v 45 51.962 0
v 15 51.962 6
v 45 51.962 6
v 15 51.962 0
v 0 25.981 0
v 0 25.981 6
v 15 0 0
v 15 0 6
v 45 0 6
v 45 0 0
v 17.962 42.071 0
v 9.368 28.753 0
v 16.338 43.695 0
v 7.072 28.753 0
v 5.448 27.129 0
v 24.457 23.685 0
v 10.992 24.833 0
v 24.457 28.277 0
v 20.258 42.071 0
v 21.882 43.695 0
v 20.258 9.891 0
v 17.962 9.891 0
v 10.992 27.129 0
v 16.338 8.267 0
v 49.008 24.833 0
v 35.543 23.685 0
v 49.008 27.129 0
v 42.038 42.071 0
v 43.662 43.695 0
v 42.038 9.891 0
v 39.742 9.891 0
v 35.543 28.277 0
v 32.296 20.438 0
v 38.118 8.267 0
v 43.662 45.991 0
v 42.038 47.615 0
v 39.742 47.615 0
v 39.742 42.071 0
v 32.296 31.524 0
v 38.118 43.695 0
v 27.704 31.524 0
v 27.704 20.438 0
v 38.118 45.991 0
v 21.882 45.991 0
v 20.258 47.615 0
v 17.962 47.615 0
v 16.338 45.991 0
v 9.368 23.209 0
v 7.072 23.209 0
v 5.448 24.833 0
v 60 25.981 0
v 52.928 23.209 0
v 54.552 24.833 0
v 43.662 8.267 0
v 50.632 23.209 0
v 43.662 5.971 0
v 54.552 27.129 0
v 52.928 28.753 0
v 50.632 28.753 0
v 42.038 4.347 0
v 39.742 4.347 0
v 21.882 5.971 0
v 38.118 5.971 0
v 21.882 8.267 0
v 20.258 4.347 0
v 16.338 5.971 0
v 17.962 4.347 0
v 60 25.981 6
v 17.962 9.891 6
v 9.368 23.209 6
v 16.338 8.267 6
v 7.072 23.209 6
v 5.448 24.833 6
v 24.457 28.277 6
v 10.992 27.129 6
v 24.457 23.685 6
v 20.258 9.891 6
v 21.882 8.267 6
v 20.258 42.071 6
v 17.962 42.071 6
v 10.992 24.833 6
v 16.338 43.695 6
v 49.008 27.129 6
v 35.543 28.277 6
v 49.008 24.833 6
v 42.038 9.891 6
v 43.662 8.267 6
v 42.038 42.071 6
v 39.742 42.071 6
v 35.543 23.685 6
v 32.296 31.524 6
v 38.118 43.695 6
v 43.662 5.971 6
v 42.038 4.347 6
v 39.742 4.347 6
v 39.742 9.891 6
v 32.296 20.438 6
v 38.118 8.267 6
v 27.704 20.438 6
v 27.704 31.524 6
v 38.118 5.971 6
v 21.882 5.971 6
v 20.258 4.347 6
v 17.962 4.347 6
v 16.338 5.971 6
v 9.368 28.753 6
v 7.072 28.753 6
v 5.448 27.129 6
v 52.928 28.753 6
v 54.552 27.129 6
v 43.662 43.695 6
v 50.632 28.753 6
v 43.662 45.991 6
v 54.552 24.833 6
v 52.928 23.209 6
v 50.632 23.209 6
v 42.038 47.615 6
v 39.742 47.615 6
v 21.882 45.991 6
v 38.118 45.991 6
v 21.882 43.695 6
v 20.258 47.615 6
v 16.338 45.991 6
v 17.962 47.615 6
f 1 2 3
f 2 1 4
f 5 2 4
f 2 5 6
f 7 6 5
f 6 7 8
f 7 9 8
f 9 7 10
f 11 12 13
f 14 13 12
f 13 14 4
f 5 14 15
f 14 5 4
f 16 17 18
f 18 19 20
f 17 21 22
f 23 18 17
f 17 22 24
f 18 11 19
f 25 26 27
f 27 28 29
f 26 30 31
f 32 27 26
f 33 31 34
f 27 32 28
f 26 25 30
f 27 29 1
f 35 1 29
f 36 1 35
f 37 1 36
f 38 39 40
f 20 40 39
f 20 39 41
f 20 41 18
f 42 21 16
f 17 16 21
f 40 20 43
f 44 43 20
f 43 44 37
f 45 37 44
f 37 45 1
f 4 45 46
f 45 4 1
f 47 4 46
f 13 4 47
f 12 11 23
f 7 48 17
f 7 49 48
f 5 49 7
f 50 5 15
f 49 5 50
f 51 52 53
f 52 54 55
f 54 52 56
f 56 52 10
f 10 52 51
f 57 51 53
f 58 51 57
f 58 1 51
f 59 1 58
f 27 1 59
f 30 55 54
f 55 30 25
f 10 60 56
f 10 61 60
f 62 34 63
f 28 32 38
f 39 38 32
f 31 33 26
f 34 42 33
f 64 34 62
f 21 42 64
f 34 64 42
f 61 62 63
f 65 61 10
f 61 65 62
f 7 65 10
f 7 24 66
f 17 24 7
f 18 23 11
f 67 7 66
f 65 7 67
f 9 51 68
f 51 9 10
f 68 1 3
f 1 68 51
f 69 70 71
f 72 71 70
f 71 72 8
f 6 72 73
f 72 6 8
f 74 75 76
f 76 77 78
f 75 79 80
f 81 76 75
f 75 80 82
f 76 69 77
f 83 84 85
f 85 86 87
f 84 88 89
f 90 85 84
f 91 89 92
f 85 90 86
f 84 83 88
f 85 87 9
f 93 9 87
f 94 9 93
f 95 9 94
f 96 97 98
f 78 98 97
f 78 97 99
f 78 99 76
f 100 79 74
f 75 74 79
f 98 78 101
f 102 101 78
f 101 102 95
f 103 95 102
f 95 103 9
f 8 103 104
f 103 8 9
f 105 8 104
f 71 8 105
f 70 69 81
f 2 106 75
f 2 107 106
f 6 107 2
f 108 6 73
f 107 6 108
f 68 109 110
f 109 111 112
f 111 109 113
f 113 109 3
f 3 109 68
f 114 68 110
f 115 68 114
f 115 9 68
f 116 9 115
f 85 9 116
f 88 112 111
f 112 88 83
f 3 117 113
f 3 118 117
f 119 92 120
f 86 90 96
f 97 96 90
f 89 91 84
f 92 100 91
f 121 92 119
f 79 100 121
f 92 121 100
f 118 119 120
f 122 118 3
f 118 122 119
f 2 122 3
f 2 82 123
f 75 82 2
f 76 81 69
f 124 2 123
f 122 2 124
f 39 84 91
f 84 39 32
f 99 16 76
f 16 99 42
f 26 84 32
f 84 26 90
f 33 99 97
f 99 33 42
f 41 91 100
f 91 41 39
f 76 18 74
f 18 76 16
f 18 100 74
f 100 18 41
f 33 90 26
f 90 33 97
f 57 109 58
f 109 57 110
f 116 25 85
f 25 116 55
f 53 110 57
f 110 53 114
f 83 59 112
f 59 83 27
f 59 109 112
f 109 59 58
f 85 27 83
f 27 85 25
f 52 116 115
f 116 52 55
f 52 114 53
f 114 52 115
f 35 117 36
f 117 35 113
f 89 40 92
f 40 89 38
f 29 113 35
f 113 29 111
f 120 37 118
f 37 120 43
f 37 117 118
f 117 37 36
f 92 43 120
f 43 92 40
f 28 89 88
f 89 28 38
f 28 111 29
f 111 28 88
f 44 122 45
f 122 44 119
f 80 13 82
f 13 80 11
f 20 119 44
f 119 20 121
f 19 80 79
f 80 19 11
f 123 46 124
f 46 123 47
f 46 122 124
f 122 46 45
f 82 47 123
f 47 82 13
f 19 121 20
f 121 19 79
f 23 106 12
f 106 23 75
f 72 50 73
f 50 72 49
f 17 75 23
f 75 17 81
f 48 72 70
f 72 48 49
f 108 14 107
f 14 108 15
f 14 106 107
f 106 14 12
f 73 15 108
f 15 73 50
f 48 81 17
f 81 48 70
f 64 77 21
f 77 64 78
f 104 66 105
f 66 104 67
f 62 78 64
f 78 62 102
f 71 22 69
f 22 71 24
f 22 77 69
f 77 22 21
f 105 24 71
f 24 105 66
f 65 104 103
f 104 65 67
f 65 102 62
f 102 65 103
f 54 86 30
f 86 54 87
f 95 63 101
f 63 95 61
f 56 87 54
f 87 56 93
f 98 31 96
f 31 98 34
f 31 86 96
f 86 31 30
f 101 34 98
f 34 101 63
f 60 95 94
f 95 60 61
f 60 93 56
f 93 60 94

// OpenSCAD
$fn = 32;

// ----------------------------------------------------------------------
// Polygon plate: 6-gon R30, 6 bolt windows
// ----------------------------------------------------------------------

// --- parameters (mm) ---
sides = 6;                // number of polygon sides
plate_r = 30;             // circumscribed radius of the polygon
bore_r = 6;               // centre bore radius
bolts = 6;                // number of bolt windows
ring_r = 21.78;           // bolt-circle radius
bolt_r = 3;               // bolt window radius
plate_t = 6;              // plate thickness, Z (extrusion height)

plate_d = 2 * plate_r;  // circumscribed diameter
bore_d = 2 * bore_r;  // centre bore diameter
bolt_d = 2 * bolt_r;  // bolt window diameter
ring_d = 2 * ring_r;  // bolt-circle diameter

profile = [[60, 25.981], [45, 51.962], [15, 51.962], [0, 25.981], [15, 0], [45, 0]];  // primary outline, 6 points, counter clockwise
void_1 = [[35.543, 28.277], [32.296, 31.524], [27.704, 31.524], [24.457, 28.277], [24.457, 23.685], [27.704, 20.438], [32.296, 20.438], [35.543, 23.685]];  // centre bore, 8 points
void_2 = [[54.552, 27.129], [52.928, 28.753], [50.632, 28.753], [49.008, 27.129], [49.008, 24.833], [50.632, 23.209], [52.928, 23.209], [54.552, 24.833]];  // bolt window 1, 8 points
void_3 = [[43.662, 45.991], [42.038, 47.615], [39.742, 47.615], [38.118, 45.991], [38.118, 43.695], [39.742, 42.071], [42.038, 42.071], [43.662, 43.695]];  // bolt window 2, 8 points
void_4 = [[21.882, 45.991], [20.258, 47.615], [17.962, 47.615], [16.338, 45.991], [16.338, 43.695], [17.962, 42.071], [20.258, 42.071], [21.882, 43.695]];  // bolt window 3, 8 points
void_5 = [[10.992, 27.129], [9.368, 28.753], [7.072, 28.753], [5.448, 27.129], [5.448, 24.833], [7.072, 23.209], [9.368, 23.209], [10.992, 24.833]];  // bolt window 4, 8 points
void_6 = [[21.882, 8.267], [20.258, 9.891], [17.962, 9.891], [16.338, 8.267], [16.338, 5.971], [17.962, 4.347], [20.258, 4.347], [21.882, 5.971]];  // bolt window 5, 8 points
void_7 = [[43.662, 8.267], [42.038, 9.891], [39.742, 9.891], [38.118, 8.267], [38.118, 5.971], [39.742, 4.347], [42.038, 4.347], [43.662, 5.971]];  // bolt window 6, 8 points

// --- the one profile operation ---
difference() {
  linear_extrude(height = plate_t) polygon(points = profile);
  translate([0, 0, -1])
    linear_extrude(height = plate_t + 2) polygon(points = void_1);
  translate([0, 0, -1])
    linear_extrude(height = plate_t + 2) polygon(points = void_2);
  translate([0, 0, -1])
    linear_extrude(height = plate_t + 2) polygon(points = void_3);
  translate([0, 0, -1])
    linear_extrude(height = plate_t + 2) polygon(points = void_4);
  translate([0, 0, -1])
    linear_extrude(height = plate_t + 2) polygon(points = void_5);
  translate([0, 0, -1])
    linear_extrude(height = plate_t + 2) polygon(points = void_6);
  translate([0, 0, -1])
    linear_extrude(height = plate_t + 2) polygon(points = void_7);
}
